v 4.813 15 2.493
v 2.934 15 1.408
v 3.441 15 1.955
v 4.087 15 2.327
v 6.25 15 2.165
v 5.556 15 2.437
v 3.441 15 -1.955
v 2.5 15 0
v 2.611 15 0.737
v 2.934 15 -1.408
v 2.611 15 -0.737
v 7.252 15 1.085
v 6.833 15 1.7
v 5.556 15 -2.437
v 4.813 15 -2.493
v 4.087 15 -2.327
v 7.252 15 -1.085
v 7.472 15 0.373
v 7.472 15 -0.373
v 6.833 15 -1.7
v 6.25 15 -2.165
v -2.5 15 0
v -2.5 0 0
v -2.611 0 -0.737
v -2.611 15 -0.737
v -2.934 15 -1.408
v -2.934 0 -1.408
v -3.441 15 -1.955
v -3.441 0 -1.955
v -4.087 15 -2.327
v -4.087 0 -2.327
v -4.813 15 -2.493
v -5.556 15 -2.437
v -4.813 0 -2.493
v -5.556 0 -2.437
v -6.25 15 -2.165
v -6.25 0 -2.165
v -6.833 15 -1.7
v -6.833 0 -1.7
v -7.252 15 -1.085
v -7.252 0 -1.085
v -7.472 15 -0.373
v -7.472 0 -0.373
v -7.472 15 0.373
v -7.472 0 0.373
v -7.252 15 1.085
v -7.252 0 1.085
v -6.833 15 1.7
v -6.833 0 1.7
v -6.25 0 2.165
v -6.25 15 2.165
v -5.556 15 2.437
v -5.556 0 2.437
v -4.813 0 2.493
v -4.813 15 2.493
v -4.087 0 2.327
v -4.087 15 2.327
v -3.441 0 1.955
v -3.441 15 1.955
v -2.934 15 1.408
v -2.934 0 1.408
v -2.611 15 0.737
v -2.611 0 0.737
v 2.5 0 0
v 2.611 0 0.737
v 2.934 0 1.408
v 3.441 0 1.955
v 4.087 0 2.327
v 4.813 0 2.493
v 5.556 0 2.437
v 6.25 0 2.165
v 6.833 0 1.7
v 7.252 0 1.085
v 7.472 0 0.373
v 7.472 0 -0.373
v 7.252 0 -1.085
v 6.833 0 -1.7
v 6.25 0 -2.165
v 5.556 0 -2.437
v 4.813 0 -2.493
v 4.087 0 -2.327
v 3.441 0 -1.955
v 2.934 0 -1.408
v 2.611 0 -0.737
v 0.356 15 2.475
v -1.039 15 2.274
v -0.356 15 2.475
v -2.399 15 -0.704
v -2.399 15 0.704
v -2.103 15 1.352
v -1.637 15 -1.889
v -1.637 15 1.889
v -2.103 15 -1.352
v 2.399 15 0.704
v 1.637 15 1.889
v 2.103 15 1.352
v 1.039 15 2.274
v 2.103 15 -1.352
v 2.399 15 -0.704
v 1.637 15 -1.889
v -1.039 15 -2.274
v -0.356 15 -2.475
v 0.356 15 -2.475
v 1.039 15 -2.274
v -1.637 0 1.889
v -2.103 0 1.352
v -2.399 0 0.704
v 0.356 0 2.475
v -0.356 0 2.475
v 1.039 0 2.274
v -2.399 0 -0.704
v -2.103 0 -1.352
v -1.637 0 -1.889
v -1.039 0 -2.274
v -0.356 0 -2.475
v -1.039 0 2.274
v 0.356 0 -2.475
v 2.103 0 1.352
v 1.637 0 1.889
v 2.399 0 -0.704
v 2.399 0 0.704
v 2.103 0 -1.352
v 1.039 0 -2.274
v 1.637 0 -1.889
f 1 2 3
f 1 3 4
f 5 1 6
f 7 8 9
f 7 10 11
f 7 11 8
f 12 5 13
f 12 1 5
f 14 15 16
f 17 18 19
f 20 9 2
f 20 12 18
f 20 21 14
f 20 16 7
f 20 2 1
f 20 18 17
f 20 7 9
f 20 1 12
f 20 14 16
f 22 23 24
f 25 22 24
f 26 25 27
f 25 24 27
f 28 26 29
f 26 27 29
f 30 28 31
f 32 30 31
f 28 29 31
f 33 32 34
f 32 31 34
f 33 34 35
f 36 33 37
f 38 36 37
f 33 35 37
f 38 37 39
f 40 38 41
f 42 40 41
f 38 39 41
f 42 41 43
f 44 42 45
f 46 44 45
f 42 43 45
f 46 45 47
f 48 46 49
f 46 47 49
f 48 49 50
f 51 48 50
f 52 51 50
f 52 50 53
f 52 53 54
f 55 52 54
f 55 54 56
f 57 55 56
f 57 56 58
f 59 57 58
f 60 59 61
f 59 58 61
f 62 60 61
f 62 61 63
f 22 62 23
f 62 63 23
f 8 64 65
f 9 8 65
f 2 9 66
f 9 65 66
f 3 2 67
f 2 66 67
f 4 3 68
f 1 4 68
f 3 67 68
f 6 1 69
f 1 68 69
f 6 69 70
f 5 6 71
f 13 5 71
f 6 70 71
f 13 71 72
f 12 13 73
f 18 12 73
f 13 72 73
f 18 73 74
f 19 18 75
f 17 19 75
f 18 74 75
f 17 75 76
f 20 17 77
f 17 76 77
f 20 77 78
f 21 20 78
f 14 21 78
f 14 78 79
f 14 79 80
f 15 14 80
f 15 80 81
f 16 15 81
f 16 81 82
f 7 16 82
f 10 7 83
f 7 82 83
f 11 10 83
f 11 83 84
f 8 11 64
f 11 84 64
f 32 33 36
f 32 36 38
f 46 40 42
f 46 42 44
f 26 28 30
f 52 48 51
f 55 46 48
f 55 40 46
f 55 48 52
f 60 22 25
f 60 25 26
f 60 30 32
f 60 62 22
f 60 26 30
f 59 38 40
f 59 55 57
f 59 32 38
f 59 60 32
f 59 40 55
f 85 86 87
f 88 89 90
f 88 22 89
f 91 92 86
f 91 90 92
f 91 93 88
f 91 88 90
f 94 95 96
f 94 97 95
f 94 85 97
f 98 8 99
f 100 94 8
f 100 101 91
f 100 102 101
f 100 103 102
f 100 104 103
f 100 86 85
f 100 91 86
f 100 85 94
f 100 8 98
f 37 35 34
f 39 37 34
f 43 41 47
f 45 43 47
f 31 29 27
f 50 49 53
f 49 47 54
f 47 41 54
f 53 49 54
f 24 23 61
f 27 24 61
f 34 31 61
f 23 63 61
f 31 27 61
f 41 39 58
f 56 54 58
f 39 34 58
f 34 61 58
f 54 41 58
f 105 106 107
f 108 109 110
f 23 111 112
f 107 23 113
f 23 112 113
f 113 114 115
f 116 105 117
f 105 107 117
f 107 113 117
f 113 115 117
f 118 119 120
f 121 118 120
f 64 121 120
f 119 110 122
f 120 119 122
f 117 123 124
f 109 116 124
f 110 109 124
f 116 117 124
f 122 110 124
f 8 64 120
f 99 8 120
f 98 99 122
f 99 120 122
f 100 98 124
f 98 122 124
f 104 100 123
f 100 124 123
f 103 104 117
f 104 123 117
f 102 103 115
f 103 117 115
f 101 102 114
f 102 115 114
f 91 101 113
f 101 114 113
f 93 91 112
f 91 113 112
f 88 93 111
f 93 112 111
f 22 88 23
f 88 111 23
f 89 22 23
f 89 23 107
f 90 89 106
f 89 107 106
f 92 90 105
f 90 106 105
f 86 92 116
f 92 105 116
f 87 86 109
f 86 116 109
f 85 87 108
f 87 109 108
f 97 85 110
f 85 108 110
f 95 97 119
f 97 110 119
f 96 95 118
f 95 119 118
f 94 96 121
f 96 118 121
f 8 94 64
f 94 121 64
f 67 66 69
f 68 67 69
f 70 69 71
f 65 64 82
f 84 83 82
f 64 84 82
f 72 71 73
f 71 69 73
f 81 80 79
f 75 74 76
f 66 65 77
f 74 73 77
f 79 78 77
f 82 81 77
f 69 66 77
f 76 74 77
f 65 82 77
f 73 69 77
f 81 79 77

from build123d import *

# Parameters (mm, degrees)
SKETCH1_R           = 2.5
BOSS_EXTRUDE1_DEPTH = 15


with BuildPart() as part:
    # Sketch1 → Boss-Extrude1 (new body)
    with BuildSketch(Plane(origin=(0, 0, 0), x_dir=(1, 0, 0), z_dir=(0, 1, 0))):
        with BuildLine():
            ThreePointArc((-2.5, 0), (0, -2.5), (2.5, 0))
            ThreePointArc((2.5, 0), (0, 2.5), (-2.5, 0))
        make_face()
        with BuildLine():
            ThreePointArc((7.5, 0), (5, 2.5), (2.5, 0))
            Line((2.5, 0), (7.5, 0))
        make_face()
        with BuildLine():
            Line((7.5, 0), (2.5, 0))
            ThreePointArc((2.5, 0), (5, -2.5), (7.5, 0))
        make_face()
        with Locations(Location((-5, 0, 0), (0, 0, 270))):
            Circle(SKETCH1_R)
    extrude(amount=BOSS_EXTRUDE1_DEPTH)


solid = part.part
